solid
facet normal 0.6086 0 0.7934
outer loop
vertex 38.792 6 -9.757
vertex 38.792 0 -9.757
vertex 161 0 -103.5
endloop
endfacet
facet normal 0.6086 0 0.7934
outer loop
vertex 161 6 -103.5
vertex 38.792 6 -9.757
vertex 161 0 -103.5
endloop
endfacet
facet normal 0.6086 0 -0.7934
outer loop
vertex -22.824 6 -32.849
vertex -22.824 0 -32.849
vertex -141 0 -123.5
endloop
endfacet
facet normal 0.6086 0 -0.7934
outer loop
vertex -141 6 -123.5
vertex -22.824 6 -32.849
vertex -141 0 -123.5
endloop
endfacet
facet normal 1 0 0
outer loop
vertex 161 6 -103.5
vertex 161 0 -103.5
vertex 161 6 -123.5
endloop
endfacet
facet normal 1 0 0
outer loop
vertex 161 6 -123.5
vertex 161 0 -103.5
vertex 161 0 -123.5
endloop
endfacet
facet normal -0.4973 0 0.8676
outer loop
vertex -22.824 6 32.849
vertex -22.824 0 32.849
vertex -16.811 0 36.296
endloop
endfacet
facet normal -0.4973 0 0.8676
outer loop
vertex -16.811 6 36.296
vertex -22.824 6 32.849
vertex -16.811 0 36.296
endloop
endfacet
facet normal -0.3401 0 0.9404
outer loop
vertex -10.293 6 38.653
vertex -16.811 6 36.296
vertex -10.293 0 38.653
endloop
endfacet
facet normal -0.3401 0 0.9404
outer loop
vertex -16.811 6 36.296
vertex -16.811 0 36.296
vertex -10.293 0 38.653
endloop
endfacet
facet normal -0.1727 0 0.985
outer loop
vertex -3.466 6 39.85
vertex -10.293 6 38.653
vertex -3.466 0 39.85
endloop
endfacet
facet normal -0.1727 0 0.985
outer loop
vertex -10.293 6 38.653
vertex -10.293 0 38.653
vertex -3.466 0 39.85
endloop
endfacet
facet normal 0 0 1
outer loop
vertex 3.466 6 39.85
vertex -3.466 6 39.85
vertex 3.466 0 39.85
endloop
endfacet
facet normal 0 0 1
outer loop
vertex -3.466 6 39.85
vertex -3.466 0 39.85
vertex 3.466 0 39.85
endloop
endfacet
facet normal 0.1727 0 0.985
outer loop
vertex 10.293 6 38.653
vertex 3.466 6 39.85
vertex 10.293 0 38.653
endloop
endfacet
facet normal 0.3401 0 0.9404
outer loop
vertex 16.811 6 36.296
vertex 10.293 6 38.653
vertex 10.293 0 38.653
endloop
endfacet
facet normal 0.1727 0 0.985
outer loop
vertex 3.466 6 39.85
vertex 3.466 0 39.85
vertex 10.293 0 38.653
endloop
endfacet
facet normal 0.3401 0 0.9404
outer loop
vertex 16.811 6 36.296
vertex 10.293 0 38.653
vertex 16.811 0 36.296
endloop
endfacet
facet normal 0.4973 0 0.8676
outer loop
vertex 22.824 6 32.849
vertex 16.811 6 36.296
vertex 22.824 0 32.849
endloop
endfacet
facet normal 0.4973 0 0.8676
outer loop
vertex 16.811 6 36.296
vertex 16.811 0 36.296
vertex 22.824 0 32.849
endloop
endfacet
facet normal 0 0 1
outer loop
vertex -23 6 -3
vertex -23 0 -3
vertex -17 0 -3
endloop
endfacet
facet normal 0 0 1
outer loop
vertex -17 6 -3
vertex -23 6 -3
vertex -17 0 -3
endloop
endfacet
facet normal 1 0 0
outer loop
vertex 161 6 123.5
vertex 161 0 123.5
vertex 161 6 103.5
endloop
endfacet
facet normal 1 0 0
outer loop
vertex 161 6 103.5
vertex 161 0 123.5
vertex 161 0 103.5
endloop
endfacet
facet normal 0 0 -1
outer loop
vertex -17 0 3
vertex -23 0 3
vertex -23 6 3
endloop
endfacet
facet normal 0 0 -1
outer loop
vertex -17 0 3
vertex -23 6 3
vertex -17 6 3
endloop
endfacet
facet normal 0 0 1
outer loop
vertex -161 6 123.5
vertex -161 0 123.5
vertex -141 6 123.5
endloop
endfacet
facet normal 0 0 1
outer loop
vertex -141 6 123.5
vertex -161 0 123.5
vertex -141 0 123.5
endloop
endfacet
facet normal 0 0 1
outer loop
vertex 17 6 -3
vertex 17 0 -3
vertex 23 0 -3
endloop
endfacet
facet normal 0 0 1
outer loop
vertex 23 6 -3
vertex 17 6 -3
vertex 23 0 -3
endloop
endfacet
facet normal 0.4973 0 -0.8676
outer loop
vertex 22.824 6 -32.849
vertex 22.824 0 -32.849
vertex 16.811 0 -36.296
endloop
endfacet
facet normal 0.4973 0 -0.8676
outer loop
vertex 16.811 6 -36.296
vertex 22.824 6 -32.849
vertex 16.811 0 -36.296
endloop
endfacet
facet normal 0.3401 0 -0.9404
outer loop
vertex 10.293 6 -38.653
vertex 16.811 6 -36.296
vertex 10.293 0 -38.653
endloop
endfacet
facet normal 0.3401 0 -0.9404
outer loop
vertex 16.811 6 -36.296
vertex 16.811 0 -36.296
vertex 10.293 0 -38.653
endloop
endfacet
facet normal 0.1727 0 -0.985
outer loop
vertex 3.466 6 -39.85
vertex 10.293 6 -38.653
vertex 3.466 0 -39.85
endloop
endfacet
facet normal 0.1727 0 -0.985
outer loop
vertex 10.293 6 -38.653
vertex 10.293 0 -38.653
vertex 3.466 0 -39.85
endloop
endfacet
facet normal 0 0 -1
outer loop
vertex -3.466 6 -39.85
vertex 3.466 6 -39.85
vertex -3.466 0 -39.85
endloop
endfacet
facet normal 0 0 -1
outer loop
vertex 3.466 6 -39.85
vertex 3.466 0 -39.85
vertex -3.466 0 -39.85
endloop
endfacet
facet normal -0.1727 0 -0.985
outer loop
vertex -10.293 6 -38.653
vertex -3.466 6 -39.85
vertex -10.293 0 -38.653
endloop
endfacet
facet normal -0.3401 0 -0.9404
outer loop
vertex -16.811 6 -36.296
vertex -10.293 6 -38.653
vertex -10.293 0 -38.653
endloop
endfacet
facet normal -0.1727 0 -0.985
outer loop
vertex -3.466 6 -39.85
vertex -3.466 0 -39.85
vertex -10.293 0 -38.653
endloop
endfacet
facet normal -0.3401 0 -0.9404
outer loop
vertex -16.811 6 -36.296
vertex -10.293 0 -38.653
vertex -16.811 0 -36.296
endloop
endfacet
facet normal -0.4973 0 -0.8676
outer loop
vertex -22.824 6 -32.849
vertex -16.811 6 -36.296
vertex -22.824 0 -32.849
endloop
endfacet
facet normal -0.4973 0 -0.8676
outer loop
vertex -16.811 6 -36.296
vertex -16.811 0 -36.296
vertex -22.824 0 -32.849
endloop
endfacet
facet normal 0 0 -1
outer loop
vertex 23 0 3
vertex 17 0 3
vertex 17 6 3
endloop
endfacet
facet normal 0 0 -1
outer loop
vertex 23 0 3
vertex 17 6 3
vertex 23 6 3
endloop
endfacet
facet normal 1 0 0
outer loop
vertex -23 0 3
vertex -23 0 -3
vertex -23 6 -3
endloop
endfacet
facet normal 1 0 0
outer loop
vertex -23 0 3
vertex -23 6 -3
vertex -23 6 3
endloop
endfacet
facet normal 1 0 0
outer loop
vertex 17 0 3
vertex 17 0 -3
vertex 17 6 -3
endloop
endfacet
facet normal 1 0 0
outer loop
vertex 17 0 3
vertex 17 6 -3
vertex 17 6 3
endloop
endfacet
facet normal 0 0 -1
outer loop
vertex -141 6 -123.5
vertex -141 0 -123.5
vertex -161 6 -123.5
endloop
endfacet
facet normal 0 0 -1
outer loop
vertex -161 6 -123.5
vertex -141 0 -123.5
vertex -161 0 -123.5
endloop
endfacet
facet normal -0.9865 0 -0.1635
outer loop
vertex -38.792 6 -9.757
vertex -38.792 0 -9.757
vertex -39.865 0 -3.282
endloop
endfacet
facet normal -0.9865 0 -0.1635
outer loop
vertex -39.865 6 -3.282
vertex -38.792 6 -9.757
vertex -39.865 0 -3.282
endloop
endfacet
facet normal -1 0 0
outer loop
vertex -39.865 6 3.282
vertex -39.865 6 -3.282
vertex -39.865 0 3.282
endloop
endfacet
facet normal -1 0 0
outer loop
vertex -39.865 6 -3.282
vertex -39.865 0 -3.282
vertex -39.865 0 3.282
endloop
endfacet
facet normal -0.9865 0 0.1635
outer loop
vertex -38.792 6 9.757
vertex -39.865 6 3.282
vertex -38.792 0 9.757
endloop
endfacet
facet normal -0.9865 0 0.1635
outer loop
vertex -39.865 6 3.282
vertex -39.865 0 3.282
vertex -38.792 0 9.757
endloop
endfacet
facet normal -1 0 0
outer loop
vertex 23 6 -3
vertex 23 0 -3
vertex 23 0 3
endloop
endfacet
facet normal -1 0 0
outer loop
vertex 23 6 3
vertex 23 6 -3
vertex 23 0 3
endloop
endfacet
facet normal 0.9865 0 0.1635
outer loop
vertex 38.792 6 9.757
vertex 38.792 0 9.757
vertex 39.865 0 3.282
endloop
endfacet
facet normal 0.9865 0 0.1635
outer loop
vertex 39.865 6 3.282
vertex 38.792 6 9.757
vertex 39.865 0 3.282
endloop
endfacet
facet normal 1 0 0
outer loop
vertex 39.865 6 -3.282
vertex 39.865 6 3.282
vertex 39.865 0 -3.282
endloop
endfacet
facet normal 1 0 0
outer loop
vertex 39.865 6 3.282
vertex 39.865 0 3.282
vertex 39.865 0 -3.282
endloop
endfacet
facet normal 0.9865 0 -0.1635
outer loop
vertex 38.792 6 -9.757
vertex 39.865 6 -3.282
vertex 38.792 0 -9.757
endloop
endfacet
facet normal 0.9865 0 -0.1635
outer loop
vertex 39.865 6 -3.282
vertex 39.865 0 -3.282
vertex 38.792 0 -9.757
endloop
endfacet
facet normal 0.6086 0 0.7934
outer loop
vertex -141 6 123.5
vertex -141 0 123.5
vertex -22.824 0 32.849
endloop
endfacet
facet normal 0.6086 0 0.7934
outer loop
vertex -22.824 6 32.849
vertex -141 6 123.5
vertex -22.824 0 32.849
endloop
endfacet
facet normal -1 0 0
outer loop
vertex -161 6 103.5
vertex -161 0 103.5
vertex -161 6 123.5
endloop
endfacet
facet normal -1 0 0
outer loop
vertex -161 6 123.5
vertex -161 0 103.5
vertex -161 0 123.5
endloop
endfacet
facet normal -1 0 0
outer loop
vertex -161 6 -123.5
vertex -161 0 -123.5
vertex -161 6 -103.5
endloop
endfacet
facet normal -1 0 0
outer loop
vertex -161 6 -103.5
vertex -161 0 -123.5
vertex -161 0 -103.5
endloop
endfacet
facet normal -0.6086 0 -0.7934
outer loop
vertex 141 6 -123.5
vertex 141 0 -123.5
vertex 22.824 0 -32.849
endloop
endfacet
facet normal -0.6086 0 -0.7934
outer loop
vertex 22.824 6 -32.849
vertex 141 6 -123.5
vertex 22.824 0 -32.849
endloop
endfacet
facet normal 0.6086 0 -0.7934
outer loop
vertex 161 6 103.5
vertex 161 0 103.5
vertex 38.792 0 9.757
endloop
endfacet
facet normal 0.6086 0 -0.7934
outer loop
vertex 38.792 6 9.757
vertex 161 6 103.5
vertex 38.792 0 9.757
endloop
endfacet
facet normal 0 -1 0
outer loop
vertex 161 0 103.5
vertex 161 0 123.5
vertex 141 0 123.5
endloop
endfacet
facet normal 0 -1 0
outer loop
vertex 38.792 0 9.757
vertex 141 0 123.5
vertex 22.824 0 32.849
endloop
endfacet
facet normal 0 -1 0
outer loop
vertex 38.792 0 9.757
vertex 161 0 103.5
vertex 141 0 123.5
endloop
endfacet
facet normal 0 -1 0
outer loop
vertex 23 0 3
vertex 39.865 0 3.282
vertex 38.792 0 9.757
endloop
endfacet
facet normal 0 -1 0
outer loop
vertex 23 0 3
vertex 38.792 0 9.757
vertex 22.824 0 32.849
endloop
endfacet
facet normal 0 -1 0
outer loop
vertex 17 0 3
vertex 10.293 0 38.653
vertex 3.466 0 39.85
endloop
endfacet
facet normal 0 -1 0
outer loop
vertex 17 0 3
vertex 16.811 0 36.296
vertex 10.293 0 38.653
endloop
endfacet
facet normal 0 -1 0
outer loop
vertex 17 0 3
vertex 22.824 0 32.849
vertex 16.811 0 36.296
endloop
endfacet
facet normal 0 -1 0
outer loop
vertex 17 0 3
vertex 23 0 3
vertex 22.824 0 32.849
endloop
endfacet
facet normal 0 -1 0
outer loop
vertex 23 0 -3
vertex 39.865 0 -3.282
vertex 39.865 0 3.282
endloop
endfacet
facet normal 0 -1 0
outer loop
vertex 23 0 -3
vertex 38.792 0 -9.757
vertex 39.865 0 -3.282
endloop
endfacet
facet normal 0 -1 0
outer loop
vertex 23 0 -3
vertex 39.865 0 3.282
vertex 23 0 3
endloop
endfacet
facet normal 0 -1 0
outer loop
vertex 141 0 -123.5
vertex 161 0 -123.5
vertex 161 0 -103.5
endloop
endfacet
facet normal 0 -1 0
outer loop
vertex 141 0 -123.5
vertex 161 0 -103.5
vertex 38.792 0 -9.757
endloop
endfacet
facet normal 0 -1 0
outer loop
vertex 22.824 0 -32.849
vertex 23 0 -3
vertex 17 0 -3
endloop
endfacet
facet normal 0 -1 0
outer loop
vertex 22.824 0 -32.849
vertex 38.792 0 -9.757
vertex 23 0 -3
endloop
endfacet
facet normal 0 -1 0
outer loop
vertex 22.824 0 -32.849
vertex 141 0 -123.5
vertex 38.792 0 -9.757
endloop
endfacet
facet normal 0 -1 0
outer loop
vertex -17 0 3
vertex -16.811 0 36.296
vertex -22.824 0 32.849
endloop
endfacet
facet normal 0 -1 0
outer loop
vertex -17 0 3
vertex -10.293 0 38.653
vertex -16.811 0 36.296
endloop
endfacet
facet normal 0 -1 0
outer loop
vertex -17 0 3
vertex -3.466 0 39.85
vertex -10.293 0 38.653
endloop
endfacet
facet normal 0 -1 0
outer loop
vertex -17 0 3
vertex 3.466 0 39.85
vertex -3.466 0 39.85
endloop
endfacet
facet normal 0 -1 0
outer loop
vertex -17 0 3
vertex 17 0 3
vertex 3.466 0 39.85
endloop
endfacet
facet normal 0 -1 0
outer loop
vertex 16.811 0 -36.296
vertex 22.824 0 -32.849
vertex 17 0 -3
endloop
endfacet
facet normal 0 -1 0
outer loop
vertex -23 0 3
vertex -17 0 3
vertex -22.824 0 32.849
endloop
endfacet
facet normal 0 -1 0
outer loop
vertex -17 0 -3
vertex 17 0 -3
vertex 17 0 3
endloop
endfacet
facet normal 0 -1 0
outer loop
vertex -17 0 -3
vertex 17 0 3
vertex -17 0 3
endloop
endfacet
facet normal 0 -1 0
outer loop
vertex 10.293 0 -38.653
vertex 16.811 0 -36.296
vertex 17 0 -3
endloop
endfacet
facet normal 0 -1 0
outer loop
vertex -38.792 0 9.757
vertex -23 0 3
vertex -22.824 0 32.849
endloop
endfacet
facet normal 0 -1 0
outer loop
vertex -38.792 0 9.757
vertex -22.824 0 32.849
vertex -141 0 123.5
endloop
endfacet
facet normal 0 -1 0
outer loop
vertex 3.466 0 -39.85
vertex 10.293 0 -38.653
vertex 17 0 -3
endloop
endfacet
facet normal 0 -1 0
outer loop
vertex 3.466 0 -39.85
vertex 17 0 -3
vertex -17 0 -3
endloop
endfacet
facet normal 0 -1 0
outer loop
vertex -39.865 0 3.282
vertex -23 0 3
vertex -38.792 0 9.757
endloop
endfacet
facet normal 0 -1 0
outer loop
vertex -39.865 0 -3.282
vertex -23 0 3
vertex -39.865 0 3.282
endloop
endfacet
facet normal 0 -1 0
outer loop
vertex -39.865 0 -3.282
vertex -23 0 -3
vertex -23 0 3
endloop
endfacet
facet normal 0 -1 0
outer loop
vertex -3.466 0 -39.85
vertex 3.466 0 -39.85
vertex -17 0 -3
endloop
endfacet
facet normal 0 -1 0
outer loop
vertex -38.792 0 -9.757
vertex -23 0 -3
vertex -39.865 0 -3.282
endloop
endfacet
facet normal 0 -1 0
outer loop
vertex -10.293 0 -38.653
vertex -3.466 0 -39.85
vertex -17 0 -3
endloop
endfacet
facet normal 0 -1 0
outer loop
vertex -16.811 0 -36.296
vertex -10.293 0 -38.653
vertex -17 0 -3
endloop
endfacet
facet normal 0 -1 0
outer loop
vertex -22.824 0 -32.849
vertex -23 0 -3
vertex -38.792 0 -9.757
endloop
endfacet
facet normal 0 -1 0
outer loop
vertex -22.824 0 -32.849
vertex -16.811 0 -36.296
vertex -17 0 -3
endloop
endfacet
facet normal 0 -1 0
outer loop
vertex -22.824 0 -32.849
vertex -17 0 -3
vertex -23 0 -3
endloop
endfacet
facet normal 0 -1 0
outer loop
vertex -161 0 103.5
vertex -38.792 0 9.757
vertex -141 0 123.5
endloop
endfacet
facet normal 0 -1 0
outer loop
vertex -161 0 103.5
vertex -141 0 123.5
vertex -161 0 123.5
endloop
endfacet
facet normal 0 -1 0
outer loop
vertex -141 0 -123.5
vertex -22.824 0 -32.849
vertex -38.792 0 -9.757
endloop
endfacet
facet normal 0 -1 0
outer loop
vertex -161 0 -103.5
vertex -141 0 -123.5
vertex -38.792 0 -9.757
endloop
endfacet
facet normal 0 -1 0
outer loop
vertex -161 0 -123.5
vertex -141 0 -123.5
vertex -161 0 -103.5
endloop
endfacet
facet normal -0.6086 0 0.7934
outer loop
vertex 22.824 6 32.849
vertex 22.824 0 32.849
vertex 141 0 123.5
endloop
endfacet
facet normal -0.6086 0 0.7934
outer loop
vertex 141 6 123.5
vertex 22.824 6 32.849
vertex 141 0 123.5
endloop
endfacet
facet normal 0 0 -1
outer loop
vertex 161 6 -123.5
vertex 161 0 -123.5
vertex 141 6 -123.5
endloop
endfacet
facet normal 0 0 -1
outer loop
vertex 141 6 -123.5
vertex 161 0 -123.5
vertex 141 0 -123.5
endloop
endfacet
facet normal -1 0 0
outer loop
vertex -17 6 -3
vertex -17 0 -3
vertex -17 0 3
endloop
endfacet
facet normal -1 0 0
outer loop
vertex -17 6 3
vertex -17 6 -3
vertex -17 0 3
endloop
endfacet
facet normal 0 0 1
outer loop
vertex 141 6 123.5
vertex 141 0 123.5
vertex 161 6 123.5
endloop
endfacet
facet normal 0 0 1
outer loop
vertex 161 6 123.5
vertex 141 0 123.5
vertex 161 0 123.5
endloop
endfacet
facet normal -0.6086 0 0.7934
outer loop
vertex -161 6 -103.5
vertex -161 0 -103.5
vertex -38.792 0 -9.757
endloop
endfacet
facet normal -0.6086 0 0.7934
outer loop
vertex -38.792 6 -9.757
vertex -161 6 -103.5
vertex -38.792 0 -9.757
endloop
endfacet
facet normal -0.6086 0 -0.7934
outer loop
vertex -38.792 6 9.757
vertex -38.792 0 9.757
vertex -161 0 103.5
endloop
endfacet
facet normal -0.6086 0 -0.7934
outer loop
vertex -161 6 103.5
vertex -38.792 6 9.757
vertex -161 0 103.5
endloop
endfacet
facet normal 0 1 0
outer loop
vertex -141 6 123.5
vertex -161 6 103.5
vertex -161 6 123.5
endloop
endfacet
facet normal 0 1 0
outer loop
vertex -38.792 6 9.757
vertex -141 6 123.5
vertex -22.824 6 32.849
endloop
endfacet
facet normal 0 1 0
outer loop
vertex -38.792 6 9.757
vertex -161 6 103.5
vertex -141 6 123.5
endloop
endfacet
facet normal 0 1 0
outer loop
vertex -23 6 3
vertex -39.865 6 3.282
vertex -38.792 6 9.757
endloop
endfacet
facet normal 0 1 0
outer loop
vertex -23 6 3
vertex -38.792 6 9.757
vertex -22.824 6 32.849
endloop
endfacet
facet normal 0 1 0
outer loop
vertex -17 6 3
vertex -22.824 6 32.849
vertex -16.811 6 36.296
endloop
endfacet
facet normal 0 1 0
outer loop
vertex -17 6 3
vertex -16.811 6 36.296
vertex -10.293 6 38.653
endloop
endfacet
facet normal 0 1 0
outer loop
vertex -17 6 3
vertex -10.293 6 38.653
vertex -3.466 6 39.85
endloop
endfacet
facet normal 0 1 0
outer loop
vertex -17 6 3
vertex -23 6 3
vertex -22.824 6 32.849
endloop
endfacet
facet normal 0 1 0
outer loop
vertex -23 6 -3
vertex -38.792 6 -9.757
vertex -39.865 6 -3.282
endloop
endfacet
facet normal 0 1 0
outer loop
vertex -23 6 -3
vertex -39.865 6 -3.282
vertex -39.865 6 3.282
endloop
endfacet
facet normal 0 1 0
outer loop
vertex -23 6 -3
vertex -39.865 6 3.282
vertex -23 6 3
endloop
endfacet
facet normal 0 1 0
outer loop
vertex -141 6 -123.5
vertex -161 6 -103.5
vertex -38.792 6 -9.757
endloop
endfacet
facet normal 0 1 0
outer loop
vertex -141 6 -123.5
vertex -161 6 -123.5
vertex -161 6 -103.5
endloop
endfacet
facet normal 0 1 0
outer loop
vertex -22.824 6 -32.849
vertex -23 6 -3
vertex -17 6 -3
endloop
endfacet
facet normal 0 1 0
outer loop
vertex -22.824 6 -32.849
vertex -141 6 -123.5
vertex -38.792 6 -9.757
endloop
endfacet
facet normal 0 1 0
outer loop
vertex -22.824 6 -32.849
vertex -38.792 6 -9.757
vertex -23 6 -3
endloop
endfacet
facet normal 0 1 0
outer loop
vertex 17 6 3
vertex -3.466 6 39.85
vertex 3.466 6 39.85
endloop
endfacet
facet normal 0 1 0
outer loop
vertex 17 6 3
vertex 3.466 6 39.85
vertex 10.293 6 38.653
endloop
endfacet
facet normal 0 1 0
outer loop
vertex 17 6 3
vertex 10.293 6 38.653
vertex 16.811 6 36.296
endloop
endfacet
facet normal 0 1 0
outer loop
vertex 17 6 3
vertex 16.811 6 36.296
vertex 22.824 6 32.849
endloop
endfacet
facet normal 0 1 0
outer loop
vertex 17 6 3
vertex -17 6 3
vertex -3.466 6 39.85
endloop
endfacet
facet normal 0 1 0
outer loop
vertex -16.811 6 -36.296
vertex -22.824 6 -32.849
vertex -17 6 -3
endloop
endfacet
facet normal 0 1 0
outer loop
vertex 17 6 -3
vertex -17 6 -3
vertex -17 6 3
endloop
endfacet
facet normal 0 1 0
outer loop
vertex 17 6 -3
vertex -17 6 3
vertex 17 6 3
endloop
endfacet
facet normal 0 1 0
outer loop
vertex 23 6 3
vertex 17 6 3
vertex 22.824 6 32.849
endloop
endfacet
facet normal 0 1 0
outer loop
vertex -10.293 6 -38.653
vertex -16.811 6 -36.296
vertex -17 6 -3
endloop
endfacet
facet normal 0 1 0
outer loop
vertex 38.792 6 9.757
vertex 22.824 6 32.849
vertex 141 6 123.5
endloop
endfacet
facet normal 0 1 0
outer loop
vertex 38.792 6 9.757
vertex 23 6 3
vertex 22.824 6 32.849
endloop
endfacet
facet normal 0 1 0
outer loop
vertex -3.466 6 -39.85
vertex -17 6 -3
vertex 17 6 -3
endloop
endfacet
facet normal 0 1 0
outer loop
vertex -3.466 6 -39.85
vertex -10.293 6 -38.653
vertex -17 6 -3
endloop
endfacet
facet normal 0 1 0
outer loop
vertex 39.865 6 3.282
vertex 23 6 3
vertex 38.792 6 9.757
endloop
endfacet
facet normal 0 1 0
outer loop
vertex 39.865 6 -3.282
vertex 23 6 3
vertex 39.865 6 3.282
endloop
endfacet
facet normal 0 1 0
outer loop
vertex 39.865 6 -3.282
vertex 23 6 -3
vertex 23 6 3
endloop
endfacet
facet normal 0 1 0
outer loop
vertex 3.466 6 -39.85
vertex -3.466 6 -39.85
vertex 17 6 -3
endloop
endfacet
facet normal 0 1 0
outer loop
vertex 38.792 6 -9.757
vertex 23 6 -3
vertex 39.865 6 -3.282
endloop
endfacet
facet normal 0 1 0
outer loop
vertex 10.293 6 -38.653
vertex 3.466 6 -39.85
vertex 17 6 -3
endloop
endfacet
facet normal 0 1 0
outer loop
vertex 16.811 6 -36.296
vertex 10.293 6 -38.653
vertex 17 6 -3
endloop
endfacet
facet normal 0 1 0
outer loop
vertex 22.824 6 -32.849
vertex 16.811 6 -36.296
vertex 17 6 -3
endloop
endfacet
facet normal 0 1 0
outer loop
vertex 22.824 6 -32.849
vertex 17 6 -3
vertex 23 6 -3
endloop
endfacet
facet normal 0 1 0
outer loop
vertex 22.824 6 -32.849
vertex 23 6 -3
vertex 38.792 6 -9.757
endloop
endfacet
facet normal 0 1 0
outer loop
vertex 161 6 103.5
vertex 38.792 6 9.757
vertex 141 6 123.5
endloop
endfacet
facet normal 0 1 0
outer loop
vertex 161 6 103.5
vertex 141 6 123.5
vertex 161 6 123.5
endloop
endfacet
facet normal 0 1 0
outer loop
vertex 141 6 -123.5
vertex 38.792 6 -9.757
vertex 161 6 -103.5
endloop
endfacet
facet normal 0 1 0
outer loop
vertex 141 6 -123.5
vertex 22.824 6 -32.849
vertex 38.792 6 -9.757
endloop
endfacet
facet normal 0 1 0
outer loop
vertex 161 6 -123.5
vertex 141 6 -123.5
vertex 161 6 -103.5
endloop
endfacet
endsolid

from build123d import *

# Parameters (mm, degrees)
SALIENTE_EXTRUIR1_DEPTH = 6
CROQUIS7_R              = 40
SALIENTE_EXTRUIR5_DEPTH = 6
SALIENTE_EXTRUIR3_DEPTH = 6
CROQUIS6_R              = 1.75
SALIENTE_EXTRUIR4_DEPTH = 6
CROQUIS8_W              = 6
CROQUIS8_H              = 6
CORTAR_EXTRUIR1_DEPTH   = 25
CROQUIS9_R              = 40
CORTAR_EXTRUIR2_DEPTH   = 18


with BuildPart() as part:
    # Croquis1 → Saliente-Extruir1 (new body)
    with BuildSketch(Plane(origin=(0, 0, 0), x_dir=(1, 0, 0), z_dir=(0, 1, 0))):
        with BuildLine():
            Line((-161, 103.5), (-38.791887254, 9.756509788))
            ThreePointArc((-38.791887254, 9.756509788), (-40, 0), (-38.791887254, -9.756509788))
            Line((-38.791887254, -9.756509788), (-161, -103.5))
            Line((-161, -103.5), (-161, -123.5))
            Line((-161, -123.5), (-141, -123.5))
            Line((-141, -123.5), (-22.823766962, -32.84928708))
            ThreePointArc((-22.823766962, -32.84928708), (0, -40), (22.823766962, -32.84928708))
            Line((22.823766962, -32.84928708), (141, -123.5))
            Line((141, -123.5), (161, -123.5))
            Line((161, -123.5), (161, -103.5))
            Line((161, -103.5), (38.791887254, -9.756509788))
            ThreePointArc((38.791887254, -9.756509788), (40, 0), (38.791887254, 9.756509788))
            Line((38.791887254, 9.756509788), (161, 103.5))
            Line((161, 103.5), (161, 123.5))
            Line((161, 123.5), (141, 123.5))
            Line((141, 123.5), (22.823766962, 32.84928708))
            ThreePointArc((22.823766962, 32.84928708), (0, 40), (-22.823766962, 32.84928708))
            Line((-22.823766962, 32.84928708), (-141, 123.5))
            Line((-141, 123.5), (-161, 123.5))
            Line((-161, 123.5), (-161, 103.5))
        make_face()
    extrude(amount=SALIENTE_EXTRUIR1_DEPTH)

    # Croquis7 → Saliente-Extruir5 (add)
    with BuildSketch(Plane(origin=(0, 0, 0), x_dir=(-1, 0, 0), z_dir=(0, -1, 0))):
        Circle(CROQUIS7_R)
    extrude(amount=SALIENTE_EXTRUIR5_DEPTH)

    # Croquis5 → Saliente-Extruir3 (add)
    with BuildSketch(Plane.XZ.offset(6)):
        with BuildLine():
            Line((18.896097481, -21), (-18.896097481, -21))
            ThreePointArc((-18.896097481, -21), (-28.25, 0), (-18.896097481, 21))
            Line((-18.896097481, 21), (-13.25, 21))
            Line((-13.25, 21), (-13.25, -11))
            Line((-13.25, -11), (13.25, -11))
            Line((13.25, -11), (13.25, 21))
            Line((13.25, 21), (18.896097481, 21))
            ThreePointArc((18.896097481, 21), (28.25, 0), (18.896097481, -21))
        make_face()
    extrude(amount=SALIENTE_EXTRUIR3_DEPTH)

    # Croquis6 → Saliente-Extruir4 (add)
    with BuildSketch(Plane.XZ.offset(12)):
        with BuildLine():
            Line((-18.896097481, 21), (-13.25, 21))
            Line((-13.25, 21), (-13.25, 3.5))
            ThreePointArc((-13.25, 3.5), (-13.103553391, 3.146446609), (-12.75, 3))
            Line((-12.75, 3), (12.75, 3))
            ThreePointArc((12.75, 3), (13.103553391, 3.146446609), (13.25, 3.5))
            Line((13.25, 3.5), (13.25, 21))
            Line((13.25, 21), (18.896097481, 21))
            ThreePointArc((18.896097481, 21), (28.25, 0), (18.896097481, -21))
            Line((18.896097481, -21), (-18.896097481, -21))
            ThreePointArc((-18.896097481, -21), (-28.25, 0), (-18.896097481, 21))
        make_face()
        with Locations((-8, -5.75)):
            Circle(CROQUIS6_R, mode=Mode.SUBTRACT)
        with Locations((8, -5.75)):
            Circle(CROQUIS6_R, mode=Mode.SUBTRACT)
    extrude(amount=SALIENTE_EXTRUIR4_DEPTH)

    # Croquis8 → Cortar-Extruir1 (cut, through all)
    with BuildSketch(Plane.XZ.offset(18)):
        with Locations((-20, 0)):
            Rectangle(CROQUIS8_W, CROQUIS8_H)
        with Locations((20, 0)):
            Rectangle(CROQUIS8_W, CROQUIS8_H)
    extrude(amount=-CORTAR_EXTRUIR1_DEPTH, mode=Mode.SUBTRACT)

    # Croquis9 → Cortar-Extruir2 (cut)
    with BuildSketch(Plane(origin=(0, -18, 0), x_dir=(-1, 0, 0), z_dir=(0, -1, 0))):
        Circle(CROQUIS9_R)
    extrude(amount=-CORTAR_EXTRUIR2_DEPTH, mode=Mode.SUBTRACT)


solid = part.part
